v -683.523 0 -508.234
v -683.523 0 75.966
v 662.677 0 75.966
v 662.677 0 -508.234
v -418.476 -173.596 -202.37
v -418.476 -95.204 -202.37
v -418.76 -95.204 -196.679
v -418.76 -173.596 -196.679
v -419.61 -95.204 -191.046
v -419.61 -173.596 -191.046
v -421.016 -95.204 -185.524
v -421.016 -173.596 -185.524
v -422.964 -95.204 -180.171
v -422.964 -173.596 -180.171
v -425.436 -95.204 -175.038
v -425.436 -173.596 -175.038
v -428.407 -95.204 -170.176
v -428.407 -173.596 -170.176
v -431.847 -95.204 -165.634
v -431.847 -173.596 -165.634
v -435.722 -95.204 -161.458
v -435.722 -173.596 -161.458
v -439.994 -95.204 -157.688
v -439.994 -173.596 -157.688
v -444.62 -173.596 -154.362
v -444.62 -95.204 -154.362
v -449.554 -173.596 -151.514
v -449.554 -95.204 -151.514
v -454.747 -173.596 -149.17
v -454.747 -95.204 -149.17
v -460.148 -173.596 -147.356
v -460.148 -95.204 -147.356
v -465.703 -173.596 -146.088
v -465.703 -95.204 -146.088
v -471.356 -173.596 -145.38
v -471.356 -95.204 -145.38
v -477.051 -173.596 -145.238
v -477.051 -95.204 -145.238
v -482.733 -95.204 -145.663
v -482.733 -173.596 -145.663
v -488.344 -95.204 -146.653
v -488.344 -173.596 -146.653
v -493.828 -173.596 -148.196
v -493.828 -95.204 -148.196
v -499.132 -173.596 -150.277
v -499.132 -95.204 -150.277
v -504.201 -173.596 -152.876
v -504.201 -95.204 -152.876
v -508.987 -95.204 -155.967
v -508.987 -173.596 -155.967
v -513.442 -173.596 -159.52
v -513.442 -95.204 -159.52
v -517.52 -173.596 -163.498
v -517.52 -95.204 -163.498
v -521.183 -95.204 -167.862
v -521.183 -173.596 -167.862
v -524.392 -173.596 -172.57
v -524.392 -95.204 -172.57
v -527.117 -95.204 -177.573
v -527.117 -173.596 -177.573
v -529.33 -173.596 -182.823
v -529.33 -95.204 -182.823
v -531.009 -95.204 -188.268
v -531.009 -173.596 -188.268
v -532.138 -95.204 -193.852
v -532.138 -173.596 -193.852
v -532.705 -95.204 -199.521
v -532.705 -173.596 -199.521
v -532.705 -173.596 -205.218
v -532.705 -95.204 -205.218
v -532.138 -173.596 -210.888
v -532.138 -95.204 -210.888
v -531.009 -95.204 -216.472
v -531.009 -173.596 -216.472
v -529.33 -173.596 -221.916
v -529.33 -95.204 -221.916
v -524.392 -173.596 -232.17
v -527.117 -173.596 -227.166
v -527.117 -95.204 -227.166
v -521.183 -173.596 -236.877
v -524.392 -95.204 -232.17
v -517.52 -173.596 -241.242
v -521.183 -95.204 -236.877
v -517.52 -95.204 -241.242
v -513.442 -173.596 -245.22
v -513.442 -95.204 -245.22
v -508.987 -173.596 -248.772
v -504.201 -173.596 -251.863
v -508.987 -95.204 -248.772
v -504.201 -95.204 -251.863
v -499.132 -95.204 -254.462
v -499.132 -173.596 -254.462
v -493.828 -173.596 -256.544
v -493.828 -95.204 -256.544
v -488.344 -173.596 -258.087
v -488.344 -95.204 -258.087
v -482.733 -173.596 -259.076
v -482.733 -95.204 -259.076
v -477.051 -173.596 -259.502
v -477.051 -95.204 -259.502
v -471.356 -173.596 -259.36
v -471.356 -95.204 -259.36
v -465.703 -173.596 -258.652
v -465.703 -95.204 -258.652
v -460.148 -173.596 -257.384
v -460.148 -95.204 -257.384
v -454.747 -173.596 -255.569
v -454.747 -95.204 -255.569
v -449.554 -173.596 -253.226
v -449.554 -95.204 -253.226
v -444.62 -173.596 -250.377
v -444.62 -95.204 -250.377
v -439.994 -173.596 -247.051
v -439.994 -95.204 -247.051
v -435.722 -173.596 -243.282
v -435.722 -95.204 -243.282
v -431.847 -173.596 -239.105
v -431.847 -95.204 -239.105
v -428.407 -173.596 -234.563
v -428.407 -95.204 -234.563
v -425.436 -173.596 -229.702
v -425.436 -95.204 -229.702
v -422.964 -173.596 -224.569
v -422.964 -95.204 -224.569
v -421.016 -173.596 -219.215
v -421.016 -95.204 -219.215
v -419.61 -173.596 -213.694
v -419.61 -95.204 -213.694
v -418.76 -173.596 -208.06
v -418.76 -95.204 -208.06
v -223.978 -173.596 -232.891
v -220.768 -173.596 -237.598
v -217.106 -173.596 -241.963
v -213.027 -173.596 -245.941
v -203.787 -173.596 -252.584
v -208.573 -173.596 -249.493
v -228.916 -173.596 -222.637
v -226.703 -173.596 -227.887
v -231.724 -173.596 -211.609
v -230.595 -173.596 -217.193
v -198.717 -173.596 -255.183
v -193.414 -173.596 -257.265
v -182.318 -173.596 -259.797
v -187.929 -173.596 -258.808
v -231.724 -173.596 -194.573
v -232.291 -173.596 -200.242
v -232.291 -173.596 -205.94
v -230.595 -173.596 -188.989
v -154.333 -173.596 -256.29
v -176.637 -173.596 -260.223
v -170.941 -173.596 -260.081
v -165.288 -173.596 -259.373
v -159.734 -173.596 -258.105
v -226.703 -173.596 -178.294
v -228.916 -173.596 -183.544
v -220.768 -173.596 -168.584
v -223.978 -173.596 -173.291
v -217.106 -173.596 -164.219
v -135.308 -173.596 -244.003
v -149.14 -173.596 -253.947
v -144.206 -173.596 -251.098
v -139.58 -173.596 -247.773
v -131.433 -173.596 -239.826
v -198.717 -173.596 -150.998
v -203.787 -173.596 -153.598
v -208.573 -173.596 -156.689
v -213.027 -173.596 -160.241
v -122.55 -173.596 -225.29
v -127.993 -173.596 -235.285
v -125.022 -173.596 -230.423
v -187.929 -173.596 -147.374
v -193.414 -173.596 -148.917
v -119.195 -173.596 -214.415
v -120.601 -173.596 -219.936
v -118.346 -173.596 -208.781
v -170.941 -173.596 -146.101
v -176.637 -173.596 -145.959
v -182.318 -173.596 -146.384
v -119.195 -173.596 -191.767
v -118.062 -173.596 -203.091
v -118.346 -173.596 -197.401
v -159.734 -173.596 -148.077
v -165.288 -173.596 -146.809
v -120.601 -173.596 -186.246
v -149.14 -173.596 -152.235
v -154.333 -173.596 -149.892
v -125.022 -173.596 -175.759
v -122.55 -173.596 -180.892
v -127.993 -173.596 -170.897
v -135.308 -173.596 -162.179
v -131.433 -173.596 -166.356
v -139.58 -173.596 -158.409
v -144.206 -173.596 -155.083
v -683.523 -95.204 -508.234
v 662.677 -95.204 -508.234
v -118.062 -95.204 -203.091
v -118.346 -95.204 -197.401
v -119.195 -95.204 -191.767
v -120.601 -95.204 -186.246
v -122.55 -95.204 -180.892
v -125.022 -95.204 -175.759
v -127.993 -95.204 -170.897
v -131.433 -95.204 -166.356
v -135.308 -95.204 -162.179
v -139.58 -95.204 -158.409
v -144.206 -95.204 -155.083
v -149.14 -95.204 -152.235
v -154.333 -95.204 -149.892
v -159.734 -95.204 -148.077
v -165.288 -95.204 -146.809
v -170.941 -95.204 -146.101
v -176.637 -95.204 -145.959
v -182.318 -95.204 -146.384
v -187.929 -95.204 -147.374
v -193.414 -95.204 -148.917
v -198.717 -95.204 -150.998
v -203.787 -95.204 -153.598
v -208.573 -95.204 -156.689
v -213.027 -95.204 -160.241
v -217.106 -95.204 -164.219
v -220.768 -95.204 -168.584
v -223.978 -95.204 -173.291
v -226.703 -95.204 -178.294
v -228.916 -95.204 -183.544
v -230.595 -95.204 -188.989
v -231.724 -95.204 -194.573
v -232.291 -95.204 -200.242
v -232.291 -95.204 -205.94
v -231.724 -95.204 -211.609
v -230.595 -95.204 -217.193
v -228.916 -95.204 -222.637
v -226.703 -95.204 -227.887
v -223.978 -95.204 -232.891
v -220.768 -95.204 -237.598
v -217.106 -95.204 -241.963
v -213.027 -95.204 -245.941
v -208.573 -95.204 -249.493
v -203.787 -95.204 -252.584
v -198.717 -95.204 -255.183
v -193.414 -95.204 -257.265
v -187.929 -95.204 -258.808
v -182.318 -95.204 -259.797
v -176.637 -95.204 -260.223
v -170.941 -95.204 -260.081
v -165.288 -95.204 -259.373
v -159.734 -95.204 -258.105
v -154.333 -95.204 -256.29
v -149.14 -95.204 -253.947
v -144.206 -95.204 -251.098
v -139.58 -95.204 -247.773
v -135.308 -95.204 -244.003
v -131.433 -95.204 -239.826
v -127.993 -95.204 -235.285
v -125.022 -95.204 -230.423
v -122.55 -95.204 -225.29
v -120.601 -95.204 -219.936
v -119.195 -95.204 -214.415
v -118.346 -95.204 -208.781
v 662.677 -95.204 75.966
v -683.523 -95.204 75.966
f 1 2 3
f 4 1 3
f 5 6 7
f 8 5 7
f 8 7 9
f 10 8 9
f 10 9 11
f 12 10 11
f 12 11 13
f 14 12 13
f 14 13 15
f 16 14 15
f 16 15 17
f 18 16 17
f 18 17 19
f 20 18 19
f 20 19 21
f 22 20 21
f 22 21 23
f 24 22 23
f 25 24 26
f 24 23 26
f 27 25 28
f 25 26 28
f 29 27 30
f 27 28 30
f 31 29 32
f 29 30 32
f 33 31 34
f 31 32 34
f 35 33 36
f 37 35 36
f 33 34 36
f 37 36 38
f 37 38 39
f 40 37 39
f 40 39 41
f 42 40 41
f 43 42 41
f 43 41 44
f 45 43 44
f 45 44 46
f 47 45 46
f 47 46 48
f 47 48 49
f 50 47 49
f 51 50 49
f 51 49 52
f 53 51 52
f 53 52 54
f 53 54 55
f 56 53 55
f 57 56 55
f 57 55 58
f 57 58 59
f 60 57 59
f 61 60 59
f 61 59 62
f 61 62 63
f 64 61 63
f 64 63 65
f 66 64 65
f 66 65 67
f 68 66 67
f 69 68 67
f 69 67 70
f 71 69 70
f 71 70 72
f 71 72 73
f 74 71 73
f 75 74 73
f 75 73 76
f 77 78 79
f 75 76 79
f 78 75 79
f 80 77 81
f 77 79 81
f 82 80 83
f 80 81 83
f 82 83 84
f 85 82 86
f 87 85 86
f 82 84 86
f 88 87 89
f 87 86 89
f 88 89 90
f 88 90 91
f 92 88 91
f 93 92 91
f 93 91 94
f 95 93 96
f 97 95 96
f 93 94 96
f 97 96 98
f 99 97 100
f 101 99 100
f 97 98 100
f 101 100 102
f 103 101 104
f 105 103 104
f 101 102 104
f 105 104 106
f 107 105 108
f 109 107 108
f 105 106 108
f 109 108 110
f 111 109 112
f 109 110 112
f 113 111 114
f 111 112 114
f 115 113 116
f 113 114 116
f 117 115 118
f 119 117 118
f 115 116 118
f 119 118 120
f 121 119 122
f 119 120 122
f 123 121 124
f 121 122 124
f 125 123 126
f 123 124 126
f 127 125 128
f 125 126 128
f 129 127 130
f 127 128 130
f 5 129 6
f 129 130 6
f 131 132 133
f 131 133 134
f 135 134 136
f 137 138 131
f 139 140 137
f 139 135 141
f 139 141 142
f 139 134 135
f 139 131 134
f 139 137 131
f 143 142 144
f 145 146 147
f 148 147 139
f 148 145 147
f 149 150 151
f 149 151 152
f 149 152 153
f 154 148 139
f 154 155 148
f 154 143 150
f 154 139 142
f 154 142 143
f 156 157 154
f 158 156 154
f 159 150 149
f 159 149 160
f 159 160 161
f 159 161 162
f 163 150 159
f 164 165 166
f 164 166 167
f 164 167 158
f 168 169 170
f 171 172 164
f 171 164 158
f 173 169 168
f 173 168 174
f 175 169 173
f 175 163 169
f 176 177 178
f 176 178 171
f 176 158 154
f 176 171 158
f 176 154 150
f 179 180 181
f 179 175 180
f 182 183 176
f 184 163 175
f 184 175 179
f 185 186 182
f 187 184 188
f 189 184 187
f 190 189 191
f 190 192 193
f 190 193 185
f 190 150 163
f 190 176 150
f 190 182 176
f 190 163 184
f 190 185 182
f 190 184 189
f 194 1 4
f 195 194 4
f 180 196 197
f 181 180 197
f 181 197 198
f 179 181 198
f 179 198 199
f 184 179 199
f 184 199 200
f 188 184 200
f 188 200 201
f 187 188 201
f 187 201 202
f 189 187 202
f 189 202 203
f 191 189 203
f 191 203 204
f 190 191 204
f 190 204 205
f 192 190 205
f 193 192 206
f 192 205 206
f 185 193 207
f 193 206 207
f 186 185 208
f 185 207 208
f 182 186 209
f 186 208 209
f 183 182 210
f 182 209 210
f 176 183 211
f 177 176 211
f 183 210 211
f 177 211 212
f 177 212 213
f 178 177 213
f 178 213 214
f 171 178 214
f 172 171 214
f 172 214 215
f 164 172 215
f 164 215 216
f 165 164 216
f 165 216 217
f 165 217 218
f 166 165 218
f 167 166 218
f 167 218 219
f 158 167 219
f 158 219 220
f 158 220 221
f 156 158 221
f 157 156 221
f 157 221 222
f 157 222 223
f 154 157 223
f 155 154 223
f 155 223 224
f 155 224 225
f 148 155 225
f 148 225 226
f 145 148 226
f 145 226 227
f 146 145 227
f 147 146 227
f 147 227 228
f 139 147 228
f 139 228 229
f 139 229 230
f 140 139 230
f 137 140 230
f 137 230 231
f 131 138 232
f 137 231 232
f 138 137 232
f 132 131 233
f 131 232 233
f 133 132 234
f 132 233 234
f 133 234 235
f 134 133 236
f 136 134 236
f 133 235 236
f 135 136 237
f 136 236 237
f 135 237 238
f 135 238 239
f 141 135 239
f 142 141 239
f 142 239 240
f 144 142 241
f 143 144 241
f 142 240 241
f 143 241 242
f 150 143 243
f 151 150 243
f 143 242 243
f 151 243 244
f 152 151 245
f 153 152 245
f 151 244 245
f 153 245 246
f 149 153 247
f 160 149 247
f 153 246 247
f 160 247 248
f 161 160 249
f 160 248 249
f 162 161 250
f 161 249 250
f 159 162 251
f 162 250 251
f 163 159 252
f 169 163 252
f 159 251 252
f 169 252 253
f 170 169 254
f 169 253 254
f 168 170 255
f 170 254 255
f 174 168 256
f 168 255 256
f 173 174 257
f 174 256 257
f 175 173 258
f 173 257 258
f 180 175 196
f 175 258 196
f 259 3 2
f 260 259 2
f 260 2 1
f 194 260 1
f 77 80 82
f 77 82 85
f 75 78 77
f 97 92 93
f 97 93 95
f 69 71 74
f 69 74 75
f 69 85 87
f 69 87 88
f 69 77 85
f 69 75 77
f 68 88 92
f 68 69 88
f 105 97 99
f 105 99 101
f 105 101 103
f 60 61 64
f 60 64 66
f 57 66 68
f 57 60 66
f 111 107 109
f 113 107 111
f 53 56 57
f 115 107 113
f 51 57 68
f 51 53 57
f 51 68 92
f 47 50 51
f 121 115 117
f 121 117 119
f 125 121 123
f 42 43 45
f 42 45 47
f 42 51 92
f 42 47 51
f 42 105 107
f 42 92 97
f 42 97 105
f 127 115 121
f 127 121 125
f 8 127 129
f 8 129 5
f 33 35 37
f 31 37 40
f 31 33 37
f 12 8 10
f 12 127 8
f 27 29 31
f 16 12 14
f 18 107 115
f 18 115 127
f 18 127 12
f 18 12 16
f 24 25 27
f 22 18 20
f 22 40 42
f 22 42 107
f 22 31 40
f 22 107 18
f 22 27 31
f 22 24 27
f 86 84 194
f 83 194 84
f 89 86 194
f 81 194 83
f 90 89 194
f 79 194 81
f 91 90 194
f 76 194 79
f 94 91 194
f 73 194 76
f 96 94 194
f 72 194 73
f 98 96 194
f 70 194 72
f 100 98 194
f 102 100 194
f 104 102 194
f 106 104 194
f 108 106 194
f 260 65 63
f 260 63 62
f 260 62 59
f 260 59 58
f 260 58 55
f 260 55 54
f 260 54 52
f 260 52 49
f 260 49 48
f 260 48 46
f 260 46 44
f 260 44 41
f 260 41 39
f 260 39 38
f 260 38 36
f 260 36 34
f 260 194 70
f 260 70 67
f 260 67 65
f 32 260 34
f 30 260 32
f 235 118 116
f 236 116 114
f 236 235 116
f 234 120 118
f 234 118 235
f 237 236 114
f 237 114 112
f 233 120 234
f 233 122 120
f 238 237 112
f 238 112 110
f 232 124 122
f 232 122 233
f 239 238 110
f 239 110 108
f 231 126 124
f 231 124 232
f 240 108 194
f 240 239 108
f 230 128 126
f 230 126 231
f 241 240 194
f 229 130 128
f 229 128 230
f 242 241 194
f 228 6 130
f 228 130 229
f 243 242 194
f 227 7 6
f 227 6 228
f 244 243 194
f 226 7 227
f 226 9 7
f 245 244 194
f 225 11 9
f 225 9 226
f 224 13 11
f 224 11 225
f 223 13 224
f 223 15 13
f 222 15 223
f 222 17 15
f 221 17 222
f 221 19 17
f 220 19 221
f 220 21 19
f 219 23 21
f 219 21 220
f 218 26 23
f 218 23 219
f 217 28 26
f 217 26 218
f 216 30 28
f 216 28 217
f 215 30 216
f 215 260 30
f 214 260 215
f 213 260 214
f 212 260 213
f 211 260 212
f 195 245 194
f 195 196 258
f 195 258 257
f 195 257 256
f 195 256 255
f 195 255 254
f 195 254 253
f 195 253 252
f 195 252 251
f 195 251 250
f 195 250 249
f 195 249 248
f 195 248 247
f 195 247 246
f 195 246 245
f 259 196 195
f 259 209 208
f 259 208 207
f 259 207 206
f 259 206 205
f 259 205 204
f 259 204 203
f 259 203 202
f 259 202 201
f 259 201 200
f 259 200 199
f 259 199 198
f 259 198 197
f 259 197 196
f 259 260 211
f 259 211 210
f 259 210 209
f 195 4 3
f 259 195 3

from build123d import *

# Parameters (mm, degrees)
F0_R     = 57.15
F1_DEPTH = 95.2044
F2_R     = 57.15
F3_DEPTH = 173.595728


with BuildPart() as f1:
    # F0 (on Front) → F1 (new body)
    with BuildSketch(Plane.XZ):
        Polygon((662.677174, 75.96576), (-683.522826, 75.96576), (-683.522826, -508.23424), (262.349523, -508.23424), (268.236725, -508.23424), (662.677174, -508.23424), align=None)
        with Locations((-475.626498, -202.36975)):
            Circle(F0_R, mode=Mode.SUBTRACT)
        with BuildLine():
            ThreePointArc((-77.100498, -202.36975), (-134.250498, -259.51975), (-191.400498, -202.36975))
            ThreePointArc((-191.400498, -202.36975), (-134.250498, -145.21975), (-77.100498, -202.36975))
        make_face(mode=Mode.SUBTRACT)
        with Locations((-475.626498, -202.36975)):
            Circle(F0_R)
        with BuildLine():
            ThreePointArc((-77.100498, -202.36975), (-134.250498, -145.21975), (-191.400498, -202.36975))
            ThreePointArc((-191.400498, -202.36975), (-134.250498, -259.51975), (-77.100498, -202.36975))
        make_face()
    extrude(amount=F1_DEPTH)

    # F2 (on Front) + F0 (on Front) → F3 (join)
    with BuildSketch(Plane.XZ):
        with Locations((-175.21213, -203.090936)):
            Circle(F2_R)
    with BuildSketch(Plane.XZ):
        with Locations((-475.626498, -202.36975)):
            Circle(F0_R)
    extrude(amount=F3_DEPTH)


solid = f1.part
